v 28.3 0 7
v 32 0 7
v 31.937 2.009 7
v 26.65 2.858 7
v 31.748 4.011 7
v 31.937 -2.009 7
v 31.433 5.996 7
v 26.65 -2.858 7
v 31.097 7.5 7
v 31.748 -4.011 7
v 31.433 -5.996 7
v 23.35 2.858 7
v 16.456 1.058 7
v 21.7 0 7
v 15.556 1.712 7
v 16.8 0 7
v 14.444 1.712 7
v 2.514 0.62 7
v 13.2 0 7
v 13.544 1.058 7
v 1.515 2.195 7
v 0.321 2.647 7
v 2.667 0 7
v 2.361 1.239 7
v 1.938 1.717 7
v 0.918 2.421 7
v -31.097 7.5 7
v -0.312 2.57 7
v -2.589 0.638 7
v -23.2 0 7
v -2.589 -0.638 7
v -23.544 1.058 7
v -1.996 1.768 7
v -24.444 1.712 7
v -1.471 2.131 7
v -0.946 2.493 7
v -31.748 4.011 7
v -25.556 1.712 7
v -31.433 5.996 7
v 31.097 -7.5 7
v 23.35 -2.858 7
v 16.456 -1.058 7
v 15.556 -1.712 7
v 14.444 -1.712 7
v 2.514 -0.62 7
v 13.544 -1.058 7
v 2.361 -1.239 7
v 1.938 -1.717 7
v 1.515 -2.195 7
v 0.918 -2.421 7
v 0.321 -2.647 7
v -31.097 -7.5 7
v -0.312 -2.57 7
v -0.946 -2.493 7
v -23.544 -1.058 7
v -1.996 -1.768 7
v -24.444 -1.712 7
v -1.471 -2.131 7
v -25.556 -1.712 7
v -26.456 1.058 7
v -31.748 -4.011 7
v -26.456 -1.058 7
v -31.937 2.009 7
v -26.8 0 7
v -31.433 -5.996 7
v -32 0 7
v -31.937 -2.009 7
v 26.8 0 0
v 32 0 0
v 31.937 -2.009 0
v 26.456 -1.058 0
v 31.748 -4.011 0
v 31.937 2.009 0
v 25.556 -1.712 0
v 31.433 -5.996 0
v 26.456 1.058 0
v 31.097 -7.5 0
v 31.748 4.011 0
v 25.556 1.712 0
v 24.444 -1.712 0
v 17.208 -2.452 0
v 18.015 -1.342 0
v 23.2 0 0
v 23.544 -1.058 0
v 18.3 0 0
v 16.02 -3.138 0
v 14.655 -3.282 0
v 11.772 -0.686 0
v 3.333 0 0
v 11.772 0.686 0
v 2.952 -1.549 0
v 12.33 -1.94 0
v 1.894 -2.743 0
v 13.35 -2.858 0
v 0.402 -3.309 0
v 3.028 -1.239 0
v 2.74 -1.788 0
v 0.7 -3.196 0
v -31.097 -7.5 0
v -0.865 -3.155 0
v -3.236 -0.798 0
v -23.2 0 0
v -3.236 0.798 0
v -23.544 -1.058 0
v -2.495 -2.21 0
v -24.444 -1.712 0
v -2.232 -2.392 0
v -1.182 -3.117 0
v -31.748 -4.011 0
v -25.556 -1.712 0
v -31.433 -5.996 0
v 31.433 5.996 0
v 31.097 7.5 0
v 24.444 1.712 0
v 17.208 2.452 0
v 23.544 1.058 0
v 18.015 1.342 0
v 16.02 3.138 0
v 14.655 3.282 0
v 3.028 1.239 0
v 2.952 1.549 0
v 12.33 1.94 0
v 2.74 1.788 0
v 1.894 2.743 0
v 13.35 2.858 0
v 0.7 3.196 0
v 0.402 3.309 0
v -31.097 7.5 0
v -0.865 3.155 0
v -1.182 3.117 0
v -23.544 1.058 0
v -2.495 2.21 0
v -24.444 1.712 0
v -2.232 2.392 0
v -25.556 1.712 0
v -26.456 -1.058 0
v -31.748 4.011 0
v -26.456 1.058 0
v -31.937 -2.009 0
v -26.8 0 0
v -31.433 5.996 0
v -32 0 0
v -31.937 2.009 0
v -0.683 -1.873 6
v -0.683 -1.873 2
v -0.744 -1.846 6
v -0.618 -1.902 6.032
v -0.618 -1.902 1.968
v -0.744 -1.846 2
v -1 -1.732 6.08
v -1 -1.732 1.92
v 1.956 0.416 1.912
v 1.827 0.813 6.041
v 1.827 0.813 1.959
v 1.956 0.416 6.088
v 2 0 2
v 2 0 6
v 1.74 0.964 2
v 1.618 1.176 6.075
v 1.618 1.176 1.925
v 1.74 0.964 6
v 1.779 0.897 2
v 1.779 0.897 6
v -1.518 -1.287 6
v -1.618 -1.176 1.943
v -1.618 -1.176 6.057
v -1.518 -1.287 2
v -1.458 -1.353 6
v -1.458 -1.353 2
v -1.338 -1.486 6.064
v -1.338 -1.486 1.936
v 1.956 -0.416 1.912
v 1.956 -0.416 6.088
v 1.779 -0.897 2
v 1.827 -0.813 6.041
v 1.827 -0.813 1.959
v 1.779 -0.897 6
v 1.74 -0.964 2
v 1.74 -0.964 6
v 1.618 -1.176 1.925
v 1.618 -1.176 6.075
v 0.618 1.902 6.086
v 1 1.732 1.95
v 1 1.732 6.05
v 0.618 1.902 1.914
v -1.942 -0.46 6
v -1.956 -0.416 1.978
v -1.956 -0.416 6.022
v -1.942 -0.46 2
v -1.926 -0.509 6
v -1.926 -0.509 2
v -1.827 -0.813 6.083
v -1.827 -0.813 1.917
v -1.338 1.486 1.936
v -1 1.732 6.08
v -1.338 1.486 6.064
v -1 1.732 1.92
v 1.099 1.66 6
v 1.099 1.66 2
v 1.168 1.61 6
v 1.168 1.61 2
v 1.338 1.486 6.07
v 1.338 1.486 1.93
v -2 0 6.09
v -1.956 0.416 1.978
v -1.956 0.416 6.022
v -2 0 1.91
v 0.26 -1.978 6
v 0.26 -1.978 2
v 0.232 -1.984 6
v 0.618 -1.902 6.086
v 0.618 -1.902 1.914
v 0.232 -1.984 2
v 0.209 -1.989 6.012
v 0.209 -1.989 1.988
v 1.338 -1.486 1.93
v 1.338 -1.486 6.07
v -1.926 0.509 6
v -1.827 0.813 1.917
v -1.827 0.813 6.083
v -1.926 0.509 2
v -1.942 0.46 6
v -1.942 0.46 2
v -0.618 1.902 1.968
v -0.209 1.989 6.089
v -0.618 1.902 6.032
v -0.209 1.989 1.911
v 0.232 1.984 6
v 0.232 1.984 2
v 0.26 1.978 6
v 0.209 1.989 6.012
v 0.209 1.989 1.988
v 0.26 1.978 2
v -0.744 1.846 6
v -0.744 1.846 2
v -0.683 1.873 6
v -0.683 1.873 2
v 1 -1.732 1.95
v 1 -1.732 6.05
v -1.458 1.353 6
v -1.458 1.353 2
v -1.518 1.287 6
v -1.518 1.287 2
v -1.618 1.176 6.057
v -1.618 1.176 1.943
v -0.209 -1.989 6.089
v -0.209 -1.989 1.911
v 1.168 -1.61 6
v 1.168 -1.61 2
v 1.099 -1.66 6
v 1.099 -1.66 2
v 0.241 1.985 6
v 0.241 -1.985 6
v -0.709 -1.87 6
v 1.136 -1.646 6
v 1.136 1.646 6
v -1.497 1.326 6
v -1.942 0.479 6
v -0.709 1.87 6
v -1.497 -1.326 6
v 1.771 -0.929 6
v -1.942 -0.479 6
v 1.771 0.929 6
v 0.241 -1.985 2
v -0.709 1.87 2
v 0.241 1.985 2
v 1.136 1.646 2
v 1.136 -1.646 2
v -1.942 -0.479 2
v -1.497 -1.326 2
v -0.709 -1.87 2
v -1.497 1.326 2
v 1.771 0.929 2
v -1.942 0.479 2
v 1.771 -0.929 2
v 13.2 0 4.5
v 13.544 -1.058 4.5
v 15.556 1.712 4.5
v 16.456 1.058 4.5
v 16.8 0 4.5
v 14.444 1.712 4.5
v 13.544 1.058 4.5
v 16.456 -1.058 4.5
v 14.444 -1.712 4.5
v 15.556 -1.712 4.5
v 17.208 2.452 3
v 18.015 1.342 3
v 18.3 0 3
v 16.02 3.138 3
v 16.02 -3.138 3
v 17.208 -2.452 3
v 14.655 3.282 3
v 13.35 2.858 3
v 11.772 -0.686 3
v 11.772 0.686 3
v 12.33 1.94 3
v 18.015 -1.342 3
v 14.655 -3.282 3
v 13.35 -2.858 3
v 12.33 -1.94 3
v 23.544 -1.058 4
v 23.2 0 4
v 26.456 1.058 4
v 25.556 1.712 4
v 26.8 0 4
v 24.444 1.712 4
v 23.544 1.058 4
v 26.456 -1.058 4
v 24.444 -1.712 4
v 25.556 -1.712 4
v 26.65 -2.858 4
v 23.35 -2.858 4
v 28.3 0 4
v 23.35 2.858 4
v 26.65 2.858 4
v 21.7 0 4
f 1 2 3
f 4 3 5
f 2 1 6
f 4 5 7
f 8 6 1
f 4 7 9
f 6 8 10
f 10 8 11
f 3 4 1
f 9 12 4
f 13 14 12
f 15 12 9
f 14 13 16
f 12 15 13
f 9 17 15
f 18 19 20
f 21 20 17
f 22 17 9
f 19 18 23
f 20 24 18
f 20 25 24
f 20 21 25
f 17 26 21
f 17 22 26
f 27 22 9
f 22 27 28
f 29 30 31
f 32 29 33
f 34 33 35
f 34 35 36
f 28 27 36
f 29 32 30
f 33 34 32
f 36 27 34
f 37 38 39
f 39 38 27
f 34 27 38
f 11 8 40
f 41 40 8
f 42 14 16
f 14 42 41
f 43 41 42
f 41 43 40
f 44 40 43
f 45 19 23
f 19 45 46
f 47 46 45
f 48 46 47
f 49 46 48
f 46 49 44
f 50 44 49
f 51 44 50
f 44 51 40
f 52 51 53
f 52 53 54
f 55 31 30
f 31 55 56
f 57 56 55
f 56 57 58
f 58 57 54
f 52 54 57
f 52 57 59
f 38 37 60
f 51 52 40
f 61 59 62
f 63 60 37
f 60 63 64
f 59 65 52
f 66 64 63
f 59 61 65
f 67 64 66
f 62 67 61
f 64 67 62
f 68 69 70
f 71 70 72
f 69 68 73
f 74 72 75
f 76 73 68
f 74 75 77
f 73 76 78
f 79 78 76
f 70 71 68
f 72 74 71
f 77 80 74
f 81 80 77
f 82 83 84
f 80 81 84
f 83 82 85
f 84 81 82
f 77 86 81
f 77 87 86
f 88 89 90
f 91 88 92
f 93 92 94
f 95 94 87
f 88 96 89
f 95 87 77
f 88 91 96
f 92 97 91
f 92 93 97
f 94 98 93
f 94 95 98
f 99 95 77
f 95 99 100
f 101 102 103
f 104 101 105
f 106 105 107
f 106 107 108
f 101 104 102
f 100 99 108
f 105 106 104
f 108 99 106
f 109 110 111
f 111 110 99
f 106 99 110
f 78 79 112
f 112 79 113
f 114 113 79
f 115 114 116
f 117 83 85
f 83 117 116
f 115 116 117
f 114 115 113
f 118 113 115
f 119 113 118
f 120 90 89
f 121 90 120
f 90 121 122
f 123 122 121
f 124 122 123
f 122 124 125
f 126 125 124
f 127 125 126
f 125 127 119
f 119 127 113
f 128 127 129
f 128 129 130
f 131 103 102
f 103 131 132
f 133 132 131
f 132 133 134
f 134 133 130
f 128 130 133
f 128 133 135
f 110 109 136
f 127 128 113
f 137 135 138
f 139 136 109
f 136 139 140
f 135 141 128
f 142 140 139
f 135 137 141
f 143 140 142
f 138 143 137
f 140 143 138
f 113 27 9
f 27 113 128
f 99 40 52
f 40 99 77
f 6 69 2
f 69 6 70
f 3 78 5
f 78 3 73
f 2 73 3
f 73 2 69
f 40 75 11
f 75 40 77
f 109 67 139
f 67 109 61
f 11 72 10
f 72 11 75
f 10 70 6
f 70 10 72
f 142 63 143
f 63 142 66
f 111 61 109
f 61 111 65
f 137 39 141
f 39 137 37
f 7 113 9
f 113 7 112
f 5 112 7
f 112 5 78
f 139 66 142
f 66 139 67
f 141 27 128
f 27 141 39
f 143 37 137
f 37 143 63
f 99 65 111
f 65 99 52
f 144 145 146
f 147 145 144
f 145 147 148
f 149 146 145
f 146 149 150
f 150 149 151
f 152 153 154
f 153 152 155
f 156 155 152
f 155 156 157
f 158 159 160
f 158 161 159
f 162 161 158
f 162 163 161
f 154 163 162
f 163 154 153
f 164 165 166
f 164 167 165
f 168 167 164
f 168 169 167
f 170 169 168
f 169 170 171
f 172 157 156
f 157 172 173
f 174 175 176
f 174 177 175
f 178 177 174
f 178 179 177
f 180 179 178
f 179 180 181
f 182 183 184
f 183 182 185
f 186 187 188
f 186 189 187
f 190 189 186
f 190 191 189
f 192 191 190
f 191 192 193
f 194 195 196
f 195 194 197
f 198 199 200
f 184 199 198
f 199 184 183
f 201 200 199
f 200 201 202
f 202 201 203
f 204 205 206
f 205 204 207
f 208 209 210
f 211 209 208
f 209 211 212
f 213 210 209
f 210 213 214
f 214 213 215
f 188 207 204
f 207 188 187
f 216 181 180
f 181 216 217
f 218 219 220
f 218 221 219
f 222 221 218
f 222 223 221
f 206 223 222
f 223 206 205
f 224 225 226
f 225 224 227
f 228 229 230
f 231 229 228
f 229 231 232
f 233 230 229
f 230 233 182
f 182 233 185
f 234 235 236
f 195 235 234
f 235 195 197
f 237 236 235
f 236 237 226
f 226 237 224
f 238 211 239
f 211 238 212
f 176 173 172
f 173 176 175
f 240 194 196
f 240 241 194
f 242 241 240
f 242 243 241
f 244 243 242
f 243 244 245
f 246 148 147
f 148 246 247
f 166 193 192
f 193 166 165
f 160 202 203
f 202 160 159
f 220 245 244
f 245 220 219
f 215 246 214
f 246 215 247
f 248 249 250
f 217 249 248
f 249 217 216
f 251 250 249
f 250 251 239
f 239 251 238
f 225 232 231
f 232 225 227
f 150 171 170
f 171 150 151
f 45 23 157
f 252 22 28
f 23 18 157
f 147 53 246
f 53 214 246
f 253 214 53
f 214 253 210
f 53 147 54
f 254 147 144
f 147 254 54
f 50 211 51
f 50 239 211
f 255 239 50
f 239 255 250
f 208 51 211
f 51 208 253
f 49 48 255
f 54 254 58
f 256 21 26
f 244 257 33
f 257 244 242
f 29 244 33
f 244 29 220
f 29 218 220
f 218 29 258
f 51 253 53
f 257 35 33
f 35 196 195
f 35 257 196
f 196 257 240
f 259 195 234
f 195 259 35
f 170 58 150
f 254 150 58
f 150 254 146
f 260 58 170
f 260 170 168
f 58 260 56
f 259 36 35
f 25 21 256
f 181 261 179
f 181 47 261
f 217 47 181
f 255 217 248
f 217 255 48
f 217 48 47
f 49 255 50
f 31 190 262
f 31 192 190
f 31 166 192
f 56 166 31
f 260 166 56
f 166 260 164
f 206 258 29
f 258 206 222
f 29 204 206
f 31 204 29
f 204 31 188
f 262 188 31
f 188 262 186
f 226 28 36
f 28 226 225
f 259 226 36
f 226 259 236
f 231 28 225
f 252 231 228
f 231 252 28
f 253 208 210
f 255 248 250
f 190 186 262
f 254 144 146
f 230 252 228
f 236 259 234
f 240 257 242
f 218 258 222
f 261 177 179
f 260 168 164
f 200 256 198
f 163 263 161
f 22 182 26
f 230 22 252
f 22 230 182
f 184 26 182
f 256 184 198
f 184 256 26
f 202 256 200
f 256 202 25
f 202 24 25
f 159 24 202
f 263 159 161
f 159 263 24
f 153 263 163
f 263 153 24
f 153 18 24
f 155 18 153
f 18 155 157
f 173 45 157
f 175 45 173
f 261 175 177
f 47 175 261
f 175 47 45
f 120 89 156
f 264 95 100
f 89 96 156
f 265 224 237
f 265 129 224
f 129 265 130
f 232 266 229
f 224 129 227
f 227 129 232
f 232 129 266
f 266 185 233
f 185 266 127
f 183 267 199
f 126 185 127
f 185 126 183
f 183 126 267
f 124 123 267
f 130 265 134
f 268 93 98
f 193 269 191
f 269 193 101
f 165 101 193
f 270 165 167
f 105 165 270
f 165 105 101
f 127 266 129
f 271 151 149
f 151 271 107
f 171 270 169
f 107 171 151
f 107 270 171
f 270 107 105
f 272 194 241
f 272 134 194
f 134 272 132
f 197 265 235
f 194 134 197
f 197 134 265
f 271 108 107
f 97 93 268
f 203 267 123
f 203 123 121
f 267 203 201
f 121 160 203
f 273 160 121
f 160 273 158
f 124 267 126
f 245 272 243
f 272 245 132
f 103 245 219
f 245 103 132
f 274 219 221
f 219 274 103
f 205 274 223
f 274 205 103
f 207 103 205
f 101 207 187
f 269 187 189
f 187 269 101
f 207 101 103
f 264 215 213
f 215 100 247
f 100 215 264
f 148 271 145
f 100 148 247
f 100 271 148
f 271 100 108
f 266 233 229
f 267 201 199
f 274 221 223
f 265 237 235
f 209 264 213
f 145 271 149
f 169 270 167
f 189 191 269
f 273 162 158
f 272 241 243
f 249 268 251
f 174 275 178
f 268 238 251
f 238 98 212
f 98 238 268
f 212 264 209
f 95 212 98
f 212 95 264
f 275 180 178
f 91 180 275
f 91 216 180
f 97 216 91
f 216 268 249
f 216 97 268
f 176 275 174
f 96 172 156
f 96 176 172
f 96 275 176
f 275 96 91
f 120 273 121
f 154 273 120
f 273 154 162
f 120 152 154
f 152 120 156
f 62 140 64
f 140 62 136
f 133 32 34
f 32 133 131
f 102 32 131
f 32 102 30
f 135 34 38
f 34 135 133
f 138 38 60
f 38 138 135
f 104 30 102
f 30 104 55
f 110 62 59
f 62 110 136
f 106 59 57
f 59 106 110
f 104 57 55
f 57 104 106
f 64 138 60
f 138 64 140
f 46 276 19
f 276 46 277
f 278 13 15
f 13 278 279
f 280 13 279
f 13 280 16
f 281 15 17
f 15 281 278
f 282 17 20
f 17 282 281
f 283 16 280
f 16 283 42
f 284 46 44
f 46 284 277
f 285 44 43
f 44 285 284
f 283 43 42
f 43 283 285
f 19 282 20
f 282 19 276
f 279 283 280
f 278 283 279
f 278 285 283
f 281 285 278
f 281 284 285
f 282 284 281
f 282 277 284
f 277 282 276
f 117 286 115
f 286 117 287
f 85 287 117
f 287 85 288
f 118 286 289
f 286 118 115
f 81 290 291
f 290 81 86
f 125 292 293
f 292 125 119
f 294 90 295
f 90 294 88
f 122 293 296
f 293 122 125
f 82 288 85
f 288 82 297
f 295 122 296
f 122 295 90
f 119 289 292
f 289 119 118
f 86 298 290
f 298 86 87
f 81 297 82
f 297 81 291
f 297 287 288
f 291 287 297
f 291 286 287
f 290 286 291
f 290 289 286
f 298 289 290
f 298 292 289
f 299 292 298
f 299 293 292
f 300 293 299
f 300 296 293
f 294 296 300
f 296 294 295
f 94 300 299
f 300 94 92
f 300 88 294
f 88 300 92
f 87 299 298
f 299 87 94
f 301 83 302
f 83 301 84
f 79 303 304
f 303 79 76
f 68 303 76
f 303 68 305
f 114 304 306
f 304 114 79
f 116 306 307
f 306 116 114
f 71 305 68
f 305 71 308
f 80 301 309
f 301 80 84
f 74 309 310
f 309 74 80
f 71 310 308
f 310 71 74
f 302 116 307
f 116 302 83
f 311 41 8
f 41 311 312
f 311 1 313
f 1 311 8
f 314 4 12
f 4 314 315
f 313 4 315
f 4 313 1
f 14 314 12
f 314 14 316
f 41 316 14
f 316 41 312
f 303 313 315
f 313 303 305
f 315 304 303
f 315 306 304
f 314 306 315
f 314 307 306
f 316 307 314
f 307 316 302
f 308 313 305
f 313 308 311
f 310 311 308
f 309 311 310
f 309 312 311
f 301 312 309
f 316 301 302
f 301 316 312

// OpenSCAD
module mount_block() {
  intersection() {
    translate(v = [0,0,7/2]) cube(size = [64,15, 7], center = true);
    cylinder(r = 64/2, h = 7, $fn = 100);
  }
}

module mount_holes() {
  // Filament hole
  translate(v = [0,0, -1]) cylinder(r = 2, h = 9, $fn = 30);
  translate([0,0,9]) rotate(a = [180,0,0]) cylinder(r1 = 4, r2 = 2, h = 3);
  translate([0,0,-1]) cylinder(r1 = 4, r2 = 2, h = 3);

  // Mount holes
  // extruder
  translate(v = [-25, 0, -1]) cylinder(r = 1.8, h = 9, $fn = 10);
  translate(v = [15, 0, 4.5]) cylinder(r = 1.8, h = 9, $fn = 10);
  translate(v = [15, 0, -1]) cylinder(r = 3.3, h = 4, $fn = 15);
  // plate
  translate(v = [25, 0, -1]) cylinder(r = 1.8, h = 9, $fn = 10);
  translate(v = [25,0,4]) cylinder(r = 3.3, h = 4, $fn = 6);
}

difference() {
  mount_block();
  mount_holes();
}
